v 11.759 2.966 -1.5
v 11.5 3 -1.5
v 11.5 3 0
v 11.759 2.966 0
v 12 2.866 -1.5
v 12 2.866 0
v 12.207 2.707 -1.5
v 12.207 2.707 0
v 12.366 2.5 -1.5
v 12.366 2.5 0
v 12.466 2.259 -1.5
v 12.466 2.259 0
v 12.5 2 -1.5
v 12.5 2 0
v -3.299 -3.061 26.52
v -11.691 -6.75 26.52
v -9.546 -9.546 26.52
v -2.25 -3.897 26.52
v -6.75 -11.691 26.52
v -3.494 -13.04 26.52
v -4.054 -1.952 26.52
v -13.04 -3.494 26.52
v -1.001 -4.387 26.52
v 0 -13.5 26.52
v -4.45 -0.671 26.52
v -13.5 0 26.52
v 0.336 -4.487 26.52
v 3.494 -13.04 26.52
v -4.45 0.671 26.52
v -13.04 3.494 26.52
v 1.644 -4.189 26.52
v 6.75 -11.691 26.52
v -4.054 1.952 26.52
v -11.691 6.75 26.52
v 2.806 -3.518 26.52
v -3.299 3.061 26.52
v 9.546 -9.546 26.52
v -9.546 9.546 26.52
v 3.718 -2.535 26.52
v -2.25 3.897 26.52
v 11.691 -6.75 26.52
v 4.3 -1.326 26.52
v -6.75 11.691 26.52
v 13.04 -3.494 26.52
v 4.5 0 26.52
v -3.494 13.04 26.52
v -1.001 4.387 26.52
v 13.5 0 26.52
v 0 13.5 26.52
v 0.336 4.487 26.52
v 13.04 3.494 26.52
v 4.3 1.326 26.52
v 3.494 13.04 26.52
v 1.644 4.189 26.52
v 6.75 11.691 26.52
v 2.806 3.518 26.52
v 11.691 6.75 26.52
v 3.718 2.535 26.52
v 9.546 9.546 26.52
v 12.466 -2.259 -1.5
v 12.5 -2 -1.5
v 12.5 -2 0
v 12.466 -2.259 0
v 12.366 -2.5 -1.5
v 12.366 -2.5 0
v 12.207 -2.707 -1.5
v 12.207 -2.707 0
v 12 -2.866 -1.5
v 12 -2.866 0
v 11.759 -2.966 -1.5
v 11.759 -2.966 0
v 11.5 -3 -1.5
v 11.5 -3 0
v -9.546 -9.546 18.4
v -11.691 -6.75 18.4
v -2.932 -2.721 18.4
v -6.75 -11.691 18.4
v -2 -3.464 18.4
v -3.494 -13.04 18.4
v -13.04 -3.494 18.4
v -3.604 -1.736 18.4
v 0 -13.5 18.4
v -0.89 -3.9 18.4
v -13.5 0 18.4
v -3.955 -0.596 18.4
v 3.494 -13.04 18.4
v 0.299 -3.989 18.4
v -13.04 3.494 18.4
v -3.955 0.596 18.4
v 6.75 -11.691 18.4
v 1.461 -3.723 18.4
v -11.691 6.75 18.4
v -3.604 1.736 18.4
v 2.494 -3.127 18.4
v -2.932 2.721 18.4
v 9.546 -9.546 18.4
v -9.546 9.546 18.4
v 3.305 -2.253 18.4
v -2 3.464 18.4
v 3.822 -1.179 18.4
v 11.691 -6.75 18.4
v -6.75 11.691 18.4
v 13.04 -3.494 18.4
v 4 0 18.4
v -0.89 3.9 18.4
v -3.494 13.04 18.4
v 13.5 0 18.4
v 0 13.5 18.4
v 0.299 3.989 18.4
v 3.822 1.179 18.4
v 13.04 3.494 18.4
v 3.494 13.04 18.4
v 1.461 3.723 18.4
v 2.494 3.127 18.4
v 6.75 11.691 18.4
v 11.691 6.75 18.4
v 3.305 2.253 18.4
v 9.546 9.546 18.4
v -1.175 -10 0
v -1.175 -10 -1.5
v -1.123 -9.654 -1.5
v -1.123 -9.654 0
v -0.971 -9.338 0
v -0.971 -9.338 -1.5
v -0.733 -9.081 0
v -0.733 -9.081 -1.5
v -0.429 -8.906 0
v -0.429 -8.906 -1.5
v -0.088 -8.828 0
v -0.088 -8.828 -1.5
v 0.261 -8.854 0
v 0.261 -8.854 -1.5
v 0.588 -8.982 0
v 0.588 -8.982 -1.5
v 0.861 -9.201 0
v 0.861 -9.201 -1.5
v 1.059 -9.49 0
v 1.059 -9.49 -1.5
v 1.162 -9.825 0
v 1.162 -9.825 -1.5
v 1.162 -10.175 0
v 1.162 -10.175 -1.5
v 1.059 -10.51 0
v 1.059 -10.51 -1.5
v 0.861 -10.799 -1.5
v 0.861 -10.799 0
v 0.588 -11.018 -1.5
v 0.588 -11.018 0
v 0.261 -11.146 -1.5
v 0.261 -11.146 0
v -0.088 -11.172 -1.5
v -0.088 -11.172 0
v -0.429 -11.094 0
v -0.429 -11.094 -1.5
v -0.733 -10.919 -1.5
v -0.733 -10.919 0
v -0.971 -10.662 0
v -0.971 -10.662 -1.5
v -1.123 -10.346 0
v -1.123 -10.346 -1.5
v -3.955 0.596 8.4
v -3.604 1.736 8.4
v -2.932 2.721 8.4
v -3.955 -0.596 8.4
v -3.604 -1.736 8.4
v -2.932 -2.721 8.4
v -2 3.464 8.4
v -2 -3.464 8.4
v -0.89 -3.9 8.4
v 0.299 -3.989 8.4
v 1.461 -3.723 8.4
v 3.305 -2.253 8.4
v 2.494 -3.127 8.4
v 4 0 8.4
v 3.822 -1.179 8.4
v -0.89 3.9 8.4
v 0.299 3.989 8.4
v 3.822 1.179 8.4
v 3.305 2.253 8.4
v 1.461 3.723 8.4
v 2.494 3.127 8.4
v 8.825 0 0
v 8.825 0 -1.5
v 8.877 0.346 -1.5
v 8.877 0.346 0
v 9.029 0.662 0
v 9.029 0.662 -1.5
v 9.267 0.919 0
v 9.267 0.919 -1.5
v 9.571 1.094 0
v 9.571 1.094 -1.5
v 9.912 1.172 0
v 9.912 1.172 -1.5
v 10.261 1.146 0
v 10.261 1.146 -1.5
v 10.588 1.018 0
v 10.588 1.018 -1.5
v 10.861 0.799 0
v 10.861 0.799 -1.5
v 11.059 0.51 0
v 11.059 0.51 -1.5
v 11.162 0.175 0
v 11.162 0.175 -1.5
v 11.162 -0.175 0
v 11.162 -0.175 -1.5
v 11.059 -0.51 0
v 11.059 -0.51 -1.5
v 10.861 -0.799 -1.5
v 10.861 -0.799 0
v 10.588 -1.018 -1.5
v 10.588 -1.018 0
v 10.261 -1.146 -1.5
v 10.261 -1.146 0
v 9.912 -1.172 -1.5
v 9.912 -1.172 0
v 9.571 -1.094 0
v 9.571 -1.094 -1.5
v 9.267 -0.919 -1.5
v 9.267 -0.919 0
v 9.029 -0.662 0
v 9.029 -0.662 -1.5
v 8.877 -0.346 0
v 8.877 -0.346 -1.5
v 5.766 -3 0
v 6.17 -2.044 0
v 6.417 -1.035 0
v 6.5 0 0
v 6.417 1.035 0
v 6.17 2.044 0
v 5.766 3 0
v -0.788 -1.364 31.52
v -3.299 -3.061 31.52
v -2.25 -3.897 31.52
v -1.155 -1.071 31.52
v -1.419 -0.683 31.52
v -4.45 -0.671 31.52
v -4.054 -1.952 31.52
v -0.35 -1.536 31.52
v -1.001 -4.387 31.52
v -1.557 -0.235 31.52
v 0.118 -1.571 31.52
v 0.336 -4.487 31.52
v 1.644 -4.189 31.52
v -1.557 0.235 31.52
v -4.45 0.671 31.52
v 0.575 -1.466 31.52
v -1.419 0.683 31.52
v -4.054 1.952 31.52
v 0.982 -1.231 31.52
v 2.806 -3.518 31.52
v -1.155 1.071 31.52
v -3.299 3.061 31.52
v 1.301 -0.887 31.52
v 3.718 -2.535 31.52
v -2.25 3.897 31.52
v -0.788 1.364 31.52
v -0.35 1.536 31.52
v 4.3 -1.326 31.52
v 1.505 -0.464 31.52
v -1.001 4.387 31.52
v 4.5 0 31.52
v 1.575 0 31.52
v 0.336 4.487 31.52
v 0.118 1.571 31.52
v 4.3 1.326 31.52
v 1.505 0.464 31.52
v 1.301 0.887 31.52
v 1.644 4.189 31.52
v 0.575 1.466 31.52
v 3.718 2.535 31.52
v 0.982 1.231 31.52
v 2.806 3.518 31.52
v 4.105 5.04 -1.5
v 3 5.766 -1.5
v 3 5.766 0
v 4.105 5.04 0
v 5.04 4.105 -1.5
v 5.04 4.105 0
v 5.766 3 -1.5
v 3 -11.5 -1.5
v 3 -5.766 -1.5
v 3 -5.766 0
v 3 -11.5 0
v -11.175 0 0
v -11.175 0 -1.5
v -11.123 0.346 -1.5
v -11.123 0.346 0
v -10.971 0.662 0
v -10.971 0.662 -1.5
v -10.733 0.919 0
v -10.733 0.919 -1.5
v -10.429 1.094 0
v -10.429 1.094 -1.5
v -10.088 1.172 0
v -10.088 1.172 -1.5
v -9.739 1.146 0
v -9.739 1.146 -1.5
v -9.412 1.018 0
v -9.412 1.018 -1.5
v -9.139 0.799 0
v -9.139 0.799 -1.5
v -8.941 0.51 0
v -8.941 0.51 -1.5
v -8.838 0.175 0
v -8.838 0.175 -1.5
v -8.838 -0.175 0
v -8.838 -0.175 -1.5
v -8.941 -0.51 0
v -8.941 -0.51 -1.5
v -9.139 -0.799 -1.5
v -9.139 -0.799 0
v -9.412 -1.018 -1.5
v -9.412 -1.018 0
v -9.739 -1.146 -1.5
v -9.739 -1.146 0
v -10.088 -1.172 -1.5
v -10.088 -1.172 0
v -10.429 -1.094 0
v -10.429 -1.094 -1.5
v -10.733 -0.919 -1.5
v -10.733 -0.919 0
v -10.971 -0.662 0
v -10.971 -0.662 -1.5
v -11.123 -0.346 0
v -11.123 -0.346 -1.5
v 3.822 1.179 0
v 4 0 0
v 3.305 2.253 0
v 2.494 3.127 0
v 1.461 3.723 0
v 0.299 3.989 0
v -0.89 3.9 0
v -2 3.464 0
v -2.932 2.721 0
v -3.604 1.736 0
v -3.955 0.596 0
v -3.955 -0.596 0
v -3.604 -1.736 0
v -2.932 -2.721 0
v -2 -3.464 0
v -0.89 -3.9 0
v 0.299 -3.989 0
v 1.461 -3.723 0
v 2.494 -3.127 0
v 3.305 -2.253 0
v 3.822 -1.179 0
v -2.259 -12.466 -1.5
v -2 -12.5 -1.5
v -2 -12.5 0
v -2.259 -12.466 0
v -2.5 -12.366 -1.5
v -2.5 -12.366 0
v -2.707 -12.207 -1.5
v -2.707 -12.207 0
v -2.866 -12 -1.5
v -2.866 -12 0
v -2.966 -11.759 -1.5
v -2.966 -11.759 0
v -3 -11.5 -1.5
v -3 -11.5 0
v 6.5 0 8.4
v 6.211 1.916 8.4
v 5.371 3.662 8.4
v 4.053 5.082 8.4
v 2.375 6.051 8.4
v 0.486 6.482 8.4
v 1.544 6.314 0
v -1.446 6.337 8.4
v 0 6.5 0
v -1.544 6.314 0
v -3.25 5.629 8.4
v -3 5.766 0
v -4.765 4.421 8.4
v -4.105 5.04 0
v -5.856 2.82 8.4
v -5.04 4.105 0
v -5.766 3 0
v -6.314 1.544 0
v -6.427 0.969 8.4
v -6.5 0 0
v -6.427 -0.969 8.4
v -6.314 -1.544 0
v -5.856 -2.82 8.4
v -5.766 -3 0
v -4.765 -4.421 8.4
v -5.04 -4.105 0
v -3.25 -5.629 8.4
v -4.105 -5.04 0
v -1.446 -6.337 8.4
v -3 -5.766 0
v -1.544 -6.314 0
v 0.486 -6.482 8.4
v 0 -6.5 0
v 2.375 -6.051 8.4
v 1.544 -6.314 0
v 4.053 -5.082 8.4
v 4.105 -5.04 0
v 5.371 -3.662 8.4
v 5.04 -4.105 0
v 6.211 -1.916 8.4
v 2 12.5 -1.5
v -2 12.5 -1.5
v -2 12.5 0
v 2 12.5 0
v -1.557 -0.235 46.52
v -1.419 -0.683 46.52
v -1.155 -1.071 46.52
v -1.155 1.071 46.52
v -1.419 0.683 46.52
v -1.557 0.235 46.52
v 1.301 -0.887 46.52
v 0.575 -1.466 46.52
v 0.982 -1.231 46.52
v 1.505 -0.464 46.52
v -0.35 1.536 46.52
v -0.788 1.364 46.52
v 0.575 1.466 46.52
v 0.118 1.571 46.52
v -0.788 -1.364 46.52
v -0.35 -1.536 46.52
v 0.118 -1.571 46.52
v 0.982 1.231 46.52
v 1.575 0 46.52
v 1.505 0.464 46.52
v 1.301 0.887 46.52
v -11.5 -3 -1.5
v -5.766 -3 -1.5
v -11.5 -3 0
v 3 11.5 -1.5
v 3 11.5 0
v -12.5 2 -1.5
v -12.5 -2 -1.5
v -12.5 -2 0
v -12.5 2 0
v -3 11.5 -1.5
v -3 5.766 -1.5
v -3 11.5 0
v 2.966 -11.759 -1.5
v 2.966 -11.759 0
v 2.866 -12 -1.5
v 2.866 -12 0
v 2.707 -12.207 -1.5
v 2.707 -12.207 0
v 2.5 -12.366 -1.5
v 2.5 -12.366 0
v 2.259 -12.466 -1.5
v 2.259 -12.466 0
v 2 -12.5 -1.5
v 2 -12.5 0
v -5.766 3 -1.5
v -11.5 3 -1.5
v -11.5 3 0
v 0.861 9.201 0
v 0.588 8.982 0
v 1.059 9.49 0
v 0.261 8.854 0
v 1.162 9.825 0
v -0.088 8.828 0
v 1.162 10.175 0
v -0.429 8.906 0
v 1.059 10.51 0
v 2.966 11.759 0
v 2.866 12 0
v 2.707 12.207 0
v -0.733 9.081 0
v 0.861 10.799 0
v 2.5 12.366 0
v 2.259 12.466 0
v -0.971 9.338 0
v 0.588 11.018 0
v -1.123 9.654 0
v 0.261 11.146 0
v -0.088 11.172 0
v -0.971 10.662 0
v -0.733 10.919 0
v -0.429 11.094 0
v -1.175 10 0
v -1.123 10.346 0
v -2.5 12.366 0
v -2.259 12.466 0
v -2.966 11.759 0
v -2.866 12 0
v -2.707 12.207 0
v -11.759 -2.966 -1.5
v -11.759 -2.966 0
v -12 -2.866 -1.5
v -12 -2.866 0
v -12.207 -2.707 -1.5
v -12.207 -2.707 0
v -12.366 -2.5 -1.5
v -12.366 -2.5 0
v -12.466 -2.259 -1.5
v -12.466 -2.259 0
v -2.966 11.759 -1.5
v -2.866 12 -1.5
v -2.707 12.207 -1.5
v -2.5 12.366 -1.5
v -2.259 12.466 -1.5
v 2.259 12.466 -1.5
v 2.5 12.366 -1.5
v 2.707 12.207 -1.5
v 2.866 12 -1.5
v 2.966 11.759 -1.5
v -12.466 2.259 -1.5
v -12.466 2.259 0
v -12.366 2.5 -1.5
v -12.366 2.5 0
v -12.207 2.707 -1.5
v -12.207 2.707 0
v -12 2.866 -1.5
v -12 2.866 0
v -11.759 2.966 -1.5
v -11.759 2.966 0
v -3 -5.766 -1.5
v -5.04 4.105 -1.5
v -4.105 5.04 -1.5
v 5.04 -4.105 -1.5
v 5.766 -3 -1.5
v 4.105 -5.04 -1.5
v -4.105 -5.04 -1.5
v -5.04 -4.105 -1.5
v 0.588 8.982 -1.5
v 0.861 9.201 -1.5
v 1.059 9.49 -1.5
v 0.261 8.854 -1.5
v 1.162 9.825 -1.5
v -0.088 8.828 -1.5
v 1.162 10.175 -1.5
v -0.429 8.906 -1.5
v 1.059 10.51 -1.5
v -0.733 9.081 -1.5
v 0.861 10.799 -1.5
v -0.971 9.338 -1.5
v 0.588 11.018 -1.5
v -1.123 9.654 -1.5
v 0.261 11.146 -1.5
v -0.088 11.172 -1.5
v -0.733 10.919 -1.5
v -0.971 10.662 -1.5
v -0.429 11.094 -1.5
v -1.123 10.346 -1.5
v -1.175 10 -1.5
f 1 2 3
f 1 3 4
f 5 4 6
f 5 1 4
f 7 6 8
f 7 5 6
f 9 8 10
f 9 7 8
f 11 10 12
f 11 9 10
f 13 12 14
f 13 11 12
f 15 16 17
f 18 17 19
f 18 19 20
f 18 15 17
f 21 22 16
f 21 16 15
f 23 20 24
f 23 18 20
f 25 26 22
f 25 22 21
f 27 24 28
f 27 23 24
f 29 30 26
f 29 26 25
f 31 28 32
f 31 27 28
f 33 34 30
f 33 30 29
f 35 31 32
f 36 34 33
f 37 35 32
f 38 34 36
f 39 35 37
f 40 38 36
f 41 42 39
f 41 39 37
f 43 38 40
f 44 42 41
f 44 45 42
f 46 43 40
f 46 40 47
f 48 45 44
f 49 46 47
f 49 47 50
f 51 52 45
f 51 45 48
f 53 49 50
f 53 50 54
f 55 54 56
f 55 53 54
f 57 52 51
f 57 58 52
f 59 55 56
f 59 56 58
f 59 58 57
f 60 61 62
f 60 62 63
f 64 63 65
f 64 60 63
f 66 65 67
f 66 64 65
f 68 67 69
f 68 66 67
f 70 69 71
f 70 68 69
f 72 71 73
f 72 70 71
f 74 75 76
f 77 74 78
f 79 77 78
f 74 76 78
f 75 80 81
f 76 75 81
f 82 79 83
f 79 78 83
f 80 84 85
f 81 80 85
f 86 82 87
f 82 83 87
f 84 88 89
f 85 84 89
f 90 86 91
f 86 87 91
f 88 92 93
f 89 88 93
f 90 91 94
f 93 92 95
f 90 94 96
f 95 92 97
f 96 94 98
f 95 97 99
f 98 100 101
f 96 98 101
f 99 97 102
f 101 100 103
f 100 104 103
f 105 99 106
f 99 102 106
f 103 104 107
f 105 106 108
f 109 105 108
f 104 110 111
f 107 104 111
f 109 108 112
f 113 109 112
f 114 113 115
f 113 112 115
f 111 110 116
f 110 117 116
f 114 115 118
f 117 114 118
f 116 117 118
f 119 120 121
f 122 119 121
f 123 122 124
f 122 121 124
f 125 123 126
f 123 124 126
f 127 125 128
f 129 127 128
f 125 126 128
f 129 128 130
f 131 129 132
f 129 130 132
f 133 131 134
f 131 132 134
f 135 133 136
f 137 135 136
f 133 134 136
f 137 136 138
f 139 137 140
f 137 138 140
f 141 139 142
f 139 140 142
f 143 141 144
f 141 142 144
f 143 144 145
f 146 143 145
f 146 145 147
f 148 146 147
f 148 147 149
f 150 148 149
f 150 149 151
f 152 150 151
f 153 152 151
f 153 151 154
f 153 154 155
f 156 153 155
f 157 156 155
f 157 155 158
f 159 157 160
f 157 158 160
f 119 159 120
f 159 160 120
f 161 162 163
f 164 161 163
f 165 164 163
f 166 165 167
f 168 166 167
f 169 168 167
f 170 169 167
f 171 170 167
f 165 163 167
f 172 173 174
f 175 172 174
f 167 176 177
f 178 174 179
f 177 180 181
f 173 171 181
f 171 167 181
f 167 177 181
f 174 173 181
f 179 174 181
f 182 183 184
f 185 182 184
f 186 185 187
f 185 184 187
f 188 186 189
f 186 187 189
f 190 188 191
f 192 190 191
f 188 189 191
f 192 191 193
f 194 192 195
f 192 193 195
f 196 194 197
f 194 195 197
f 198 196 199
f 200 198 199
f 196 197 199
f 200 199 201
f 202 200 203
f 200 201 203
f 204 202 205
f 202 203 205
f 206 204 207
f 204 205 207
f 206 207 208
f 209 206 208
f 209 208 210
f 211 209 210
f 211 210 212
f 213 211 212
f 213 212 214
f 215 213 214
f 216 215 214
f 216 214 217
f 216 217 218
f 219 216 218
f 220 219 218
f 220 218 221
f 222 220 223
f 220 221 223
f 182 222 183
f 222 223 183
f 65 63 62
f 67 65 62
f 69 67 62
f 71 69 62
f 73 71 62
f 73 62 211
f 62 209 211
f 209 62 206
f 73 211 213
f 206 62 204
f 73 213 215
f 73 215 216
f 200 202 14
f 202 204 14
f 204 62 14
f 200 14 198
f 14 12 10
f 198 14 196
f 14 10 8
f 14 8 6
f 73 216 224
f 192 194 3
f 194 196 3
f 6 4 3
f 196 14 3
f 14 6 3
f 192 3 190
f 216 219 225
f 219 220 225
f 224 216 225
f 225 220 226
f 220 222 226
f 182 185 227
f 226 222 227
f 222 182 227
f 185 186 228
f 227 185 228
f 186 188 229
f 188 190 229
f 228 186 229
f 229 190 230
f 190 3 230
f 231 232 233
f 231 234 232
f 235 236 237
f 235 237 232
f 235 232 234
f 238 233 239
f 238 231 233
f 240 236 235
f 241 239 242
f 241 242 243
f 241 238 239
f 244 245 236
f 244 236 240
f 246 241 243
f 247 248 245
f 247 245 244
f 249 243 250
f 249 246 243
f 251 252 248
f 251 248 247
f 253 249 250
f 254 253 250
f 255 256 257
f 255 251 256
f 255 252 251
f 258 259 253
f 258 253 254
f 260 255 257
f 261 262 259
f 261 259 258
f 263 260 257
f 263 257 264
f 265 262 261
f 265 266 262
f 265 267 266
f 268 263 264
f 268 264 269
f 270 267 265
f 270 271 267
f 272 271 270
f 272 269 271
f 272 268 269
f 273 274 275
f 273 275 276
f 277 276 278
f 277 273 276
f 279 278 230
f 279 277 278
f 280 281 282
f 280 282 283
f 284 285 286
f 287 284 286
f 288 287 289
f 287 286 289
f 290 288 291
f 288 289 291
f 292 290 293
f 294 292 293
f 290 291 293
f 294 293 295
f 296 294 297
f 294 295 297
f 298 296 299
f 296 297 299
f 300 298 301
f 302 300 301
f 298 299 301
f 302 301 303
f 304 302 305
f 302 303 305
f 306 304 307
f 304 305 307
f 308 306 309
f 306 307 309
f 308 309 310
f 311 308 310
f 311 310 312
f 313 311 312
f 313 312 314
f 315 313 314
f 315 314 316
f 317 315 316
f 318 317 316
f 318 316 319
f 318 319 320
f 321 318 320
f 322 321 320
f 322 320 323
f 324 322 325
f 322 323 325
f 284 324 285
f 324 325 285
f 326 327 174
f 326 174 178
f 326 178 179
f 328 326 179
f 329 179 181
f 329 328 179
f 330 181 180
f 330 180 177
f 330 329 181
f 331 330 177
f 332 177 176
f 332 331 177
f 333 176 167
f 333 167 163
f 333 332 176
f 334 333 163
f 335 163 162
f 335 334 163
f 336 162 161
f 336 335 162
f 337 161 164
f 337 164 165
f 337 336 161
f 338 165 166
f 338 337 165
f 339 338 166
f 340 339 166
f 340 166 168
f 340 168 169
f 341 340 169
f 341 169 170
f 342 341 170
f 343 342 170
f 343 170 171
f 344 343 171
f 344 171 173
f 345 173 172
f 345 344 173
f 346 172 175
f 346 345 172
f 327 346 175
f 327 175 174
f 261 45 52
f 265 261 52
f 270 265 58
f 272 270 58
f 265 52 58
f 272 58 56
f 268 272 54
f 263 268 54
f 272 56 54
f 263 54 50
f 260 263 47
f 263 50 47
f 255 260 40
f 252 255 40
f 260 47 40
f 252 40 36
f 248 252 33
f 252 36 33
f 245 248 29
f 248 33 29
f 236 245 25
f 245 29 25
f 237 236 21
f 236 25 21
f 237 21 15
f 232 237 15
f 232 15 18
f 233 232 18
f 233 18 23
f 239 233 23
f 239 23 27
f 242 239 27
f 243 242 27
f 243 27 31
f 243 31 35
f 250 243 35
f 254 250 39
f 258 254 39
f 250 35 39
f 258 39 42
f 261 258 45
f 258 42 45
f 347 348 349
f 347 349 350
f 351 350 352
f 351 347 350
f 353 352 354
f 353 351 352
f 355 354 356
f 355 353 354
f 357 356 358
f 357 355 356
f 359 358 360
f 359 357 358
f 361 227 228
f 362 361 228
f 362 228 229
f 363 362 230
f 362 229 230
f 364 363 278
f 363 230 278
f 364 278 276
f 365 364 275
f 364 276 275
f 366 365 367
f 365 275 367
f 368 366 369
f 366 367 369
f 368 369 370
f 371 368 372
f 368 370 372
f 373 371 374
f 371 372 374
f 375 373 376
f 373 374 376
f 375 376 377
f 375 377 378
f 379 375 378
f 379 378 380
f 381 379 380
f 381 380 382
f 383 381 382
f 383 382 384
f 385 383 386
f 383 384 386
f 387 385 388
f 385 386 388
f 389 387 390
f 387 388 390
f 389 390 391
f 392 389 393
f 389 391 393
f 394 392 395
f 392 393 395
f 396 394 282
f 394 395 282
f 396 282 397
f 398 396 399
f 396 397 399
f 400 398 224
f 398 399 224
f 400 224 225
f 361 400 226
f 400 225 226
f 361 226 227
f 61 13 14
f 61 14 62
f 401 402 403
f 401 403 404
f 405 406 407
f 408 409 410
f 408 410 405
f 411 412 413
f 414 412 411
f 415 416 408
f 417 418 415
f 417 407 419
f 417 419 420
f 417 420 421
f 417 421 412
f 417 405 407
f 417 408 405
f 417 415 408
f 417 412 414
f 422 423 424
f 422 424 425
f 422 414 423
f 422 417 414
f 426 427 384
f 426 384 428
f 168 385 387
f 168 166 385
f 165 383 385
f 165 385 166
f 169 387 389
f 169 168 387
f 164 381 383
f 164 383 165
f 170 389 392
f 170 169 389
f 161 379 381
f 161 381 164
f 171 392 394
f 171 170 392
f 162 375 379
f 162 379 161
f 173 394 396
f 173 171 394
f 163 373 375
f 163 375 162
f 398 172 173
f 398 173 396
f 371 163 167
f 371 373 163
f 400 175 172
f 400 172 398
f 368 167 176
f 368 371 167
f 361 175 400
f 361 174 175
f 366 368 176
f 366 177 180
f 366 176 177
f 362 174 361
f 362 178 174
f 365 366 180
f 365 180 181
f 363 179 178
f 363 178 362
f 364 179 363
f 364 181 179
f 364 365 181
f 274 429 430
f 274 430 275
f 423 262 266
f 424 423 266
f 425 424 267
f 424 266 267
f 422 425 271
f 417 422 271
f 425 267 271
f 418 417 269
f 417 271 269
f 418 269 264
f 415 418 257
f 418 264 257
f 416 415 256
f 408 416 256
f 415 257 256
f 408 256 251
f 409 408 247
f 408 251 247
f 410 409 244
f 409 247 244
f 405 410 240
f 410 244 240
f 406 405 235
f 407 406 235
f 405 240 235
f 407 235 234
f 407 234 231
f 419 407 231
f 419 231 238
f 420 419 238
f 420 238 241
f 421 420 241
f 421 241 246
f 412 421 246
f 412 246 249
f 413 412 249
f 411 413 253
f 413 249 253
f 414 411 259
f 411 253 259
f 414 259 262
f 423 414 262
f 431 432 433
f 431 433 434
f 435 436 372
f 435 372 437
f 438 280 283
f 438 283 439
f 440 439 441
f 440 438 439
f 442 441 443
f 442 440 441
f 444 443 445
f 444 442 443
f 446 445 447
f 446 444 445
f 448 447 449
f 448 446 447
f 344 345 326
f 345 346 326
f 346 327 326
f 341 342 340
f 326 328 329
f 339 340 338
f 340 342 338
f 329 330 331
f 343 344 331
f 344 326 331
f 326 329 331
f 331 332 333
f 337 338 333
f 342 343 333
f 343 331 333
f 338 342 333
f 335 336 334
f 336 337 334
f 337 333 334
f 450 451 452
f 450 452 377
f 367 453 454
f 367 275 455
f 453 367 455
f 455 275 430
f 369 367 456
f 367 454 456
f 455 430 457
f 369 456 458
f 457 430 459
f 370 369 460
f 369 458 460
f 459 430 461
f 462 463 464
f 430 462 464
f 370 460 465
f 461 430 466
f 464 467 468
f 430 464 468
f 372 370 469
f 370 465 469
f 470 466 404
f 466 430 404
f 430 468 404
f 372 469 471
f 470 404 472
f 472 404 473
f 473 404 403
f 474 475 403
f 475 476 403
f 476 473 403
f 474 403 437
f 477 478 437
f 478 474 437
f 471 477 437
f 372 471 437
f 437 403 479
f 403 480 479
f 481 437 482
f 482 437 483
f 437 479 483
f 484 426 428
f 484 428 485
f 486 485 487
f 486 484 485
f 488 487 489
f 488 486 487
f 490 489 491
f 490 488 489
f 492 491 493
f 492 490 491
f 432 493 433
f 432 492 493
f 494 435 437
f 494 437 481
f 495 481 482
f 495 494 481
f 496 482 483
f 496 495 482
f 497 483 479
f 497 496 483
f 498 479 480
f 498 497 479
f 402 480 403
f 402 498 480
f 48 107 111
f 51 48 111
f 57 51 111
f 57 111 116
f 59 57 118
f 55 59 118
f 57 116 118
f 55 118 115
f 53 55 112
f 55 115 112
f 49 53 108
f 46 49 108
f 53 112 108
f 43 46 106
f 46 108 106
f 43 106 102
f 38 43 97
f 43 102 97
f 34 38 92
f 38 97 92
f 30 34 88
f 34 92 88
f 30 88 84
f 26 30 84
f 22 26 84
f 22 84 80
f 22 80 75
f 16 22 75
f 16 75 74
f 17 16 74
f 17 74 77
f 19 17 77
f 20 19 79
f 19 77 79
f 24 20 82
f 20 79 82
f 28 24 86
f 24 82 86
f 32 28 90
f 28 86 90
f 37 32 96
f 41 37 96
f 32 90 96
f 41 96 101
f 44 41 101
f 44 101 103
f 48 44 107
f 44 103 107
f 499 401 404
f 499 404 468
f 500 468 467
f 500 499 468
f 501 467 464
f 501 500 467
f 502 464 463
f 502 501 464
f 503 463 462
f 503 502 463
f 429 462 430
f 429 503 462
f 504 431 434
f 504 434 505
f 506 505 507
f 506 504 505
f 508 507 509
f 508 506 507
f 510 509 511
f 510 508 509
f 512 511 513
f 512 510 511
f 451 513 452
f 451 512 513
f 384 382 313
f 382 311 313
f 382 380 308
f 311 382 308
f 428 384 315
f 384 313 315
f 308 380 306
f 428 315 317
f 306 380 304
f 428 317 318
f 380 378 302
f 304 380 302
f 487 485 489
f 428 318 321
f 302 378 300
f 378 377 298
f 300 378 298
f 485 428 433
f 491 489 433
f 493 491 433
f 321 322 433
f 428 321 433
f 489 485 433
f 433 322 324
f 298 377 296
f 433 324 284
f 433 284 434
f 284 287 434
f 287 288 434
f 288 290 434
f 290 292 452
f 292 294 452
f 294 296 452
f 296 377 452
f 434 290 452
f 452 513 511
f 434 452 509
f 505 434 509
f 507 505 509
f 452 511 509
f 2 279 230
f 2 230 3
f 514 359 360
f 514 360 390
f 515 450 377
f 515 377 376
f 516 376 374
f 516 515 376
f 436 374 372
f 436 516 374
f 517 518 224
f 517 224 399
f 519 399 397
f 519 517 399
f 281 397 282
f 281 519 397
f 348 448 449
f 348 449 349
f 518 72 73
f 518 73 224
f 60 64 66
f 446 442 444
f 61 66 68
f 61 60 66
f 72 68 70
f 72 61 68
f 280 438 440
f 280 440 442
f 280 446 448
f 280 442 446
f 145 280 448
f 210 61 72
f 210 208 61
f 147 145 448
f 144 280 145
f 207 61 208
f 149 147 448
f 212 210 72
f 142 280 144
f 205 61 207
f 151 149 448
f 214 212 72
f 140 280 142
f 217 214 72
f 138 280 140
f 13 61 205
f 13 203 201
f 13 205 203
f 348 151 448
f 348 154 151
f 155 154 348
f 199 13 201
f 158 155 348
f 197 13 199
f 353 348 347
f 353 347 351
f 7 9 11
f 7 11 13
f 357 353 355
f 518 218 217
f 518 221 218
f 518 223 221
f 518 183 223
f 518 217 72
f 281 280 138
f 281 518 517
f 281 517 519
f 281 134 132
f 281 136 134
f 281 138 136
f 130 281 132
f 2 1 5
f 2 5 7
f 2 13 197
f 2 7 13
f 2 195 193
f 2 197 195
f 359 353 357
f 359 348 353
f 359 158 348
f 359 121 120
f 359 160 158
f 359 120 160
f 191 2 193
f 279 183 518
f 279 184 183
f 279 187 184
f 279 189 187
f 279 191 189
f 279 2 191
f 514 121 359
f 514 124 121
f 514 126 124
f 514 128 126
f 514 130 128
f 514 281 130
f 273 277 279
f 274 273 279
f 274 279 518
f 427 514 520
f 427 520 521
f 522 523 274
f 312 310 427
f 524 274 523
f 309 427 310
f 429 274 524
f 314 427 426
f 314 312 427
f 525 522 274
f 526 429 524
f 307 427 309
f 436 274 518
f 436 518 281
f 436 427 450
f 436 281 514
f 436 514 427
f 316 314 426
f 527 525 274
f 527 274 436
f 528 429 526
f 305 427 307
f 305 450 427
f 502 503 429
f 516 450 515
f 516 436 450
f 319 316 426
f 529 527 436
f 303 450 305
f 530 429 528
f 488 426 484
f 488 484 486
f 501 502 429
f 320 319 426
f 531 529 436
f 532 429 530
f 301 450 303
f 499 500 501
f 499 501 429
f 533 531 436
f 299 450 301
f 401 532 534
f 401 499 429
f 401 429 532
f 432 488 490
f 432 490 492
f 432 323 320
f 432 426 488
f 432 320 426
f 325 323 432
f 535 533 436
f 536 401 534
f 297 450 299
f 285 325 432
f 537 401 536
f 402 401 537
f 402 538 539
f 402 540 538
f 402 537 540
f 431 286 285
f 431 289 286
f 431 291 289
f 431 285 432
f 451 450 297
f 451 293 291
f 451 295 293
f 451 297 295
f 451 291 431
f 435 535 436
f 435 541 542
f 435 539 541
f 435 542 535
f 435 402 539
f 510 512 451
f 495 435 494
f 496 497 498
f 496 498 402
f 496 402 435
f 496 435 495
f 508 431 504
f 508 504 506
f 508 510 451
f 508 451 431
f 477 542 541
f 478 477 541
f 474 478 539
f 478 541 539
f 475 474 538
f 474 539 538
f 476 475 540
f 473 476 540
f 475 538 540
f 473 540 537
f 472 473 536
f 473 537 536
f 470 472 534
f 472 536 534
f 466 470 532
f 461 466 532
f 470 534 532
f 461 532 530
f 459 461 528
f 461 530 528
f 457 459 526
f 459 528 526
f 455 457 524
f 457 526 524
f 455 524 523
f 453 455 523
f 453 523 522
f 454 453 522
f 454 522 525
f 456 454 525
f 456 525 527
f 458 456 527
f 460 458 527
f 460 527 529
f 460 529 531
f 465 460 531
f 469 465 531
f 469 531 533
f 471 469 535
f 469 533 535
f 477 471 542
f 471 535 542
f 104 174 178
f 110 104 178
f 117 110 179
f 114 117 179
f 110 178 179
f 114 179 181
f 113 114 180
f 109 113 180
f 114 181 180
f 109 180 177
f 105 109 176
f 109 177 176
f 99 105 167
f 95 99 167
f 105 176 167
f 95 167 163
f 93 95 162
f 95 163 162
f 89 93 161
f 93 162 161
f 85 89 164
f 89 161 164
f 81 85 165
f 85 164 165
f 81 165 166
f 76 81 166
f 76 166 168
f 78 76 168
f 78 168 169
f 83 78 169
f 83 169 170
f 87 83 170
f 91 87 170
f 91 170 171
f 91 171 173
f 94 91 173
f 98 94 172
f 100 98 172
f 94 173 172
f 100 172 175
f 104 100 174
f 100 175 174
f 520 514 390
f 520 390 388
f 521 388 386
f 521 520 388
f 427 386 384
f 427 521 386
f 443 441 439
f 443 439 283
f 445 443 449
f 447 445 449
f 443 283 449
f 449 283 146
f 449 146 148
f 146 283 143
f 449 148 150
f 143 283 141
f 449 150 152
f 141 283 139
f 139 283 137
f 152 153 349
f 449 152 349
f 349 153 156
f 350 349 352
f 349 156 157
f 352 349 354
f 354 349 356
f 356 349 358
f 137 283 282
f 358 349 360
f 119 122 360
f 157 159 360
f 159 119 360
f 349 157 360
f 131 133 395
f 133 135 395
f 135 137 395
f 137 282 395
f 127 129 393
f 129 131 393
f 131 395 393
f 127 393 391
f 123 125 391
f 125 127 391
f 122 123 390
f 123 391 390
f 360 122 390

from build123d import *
from build123d.topology import SkipClean

# Parameters (mm, degrees)
CROQUIS1_R              = 6.5
CROQUIS1_R_2            = 4
SALIENTE_EXTRUIR1_DEPTH = 8.4
CROQUIS2_R              = 4
SALIENTE_EXTRUIR2_DEPTH = 10
CROQUIS3_R              = 13.5
SALIENTE_EXTRUIR3_DEPTH = 8.12
CROQUIS4_R              = 4.5
SALIENTE_EXTRUIR4_DEPTH = 5
CROQUIS5_R              = 1.575
SALIENTE_EXTRUIR5_DEPTH = 15
SALIENTE_EXTRUIR6_START = 1.5
CROQUIS6_R              = 1.175
SALIENTE_EXTRUIR6_DEPTH = 1.5


with BuildPart() as part:
    # Croquis1 → Saliente-Extruir1 (new body)
    with BuildSketch(Plane.XY):
        Circle(CROQUIS1_R)
        Circle(CROQUIS1_R_2, mode=Mode.SUBTRACT)
    extrude(amount=SALIENTE_EXTRUIR1_DEPTH)

    # Croquis6 → Saliente-Extruir6 (add)
    with SkipClean():  # the faces are left unmerged after this step: merging them gives an invalid solid
        with BuildSketch(Plane(origin=(0, 0, 0), x_dir=(-1, 0, 0), z_dir=(0, 0, -1)).offset(SALIENTE_EXTRUIR6_START)):
            with BuildLine():
                Line((-2, -12.5), (2, -12.5))
                ThreePointArc((2, -12.5), (2.707106781, -12.207106781), (3, -11.5))
                Line((3, -11.5), (3, -5.766281297))
                ThreePointArc((3, -5.766281297), (4.596194078, -4.596194078), (5.766281297, -3))
                Line((5.766281297, -3), (11.5, -3))
                ThreePointArc((11.5, -3), (12.207106781, -2.707106781), (12.5, -2))
                Line((12.5, -2), (12.5, 2))
                ThreePointArc((12.5, 2), (12.207106781, 2.707106781), (11.5, 3))
                Line((11.5, 3), (5.766281297, 3))
                ThreePointArc((5.766281297, 3), (4.596194078, 4.596194078), (3, 5.766281297))
                Line((3, 5.766281297), (3, 11.5))
                ThreePointArc((3, 11.5), (2.707106781, 12.207106781), (2, 12.5))
                Line((2, 12.5), (-2, 12.5))
                ThreePointArc((-2, 12.5), (-2.707106781, 12.207106781), (-3, 11.5))
                Line((-3, 11.5), (-3, 5.766281297))
                ThreePointArc((-3, 5.766281297), (-4.596194078, 4.596194078), (-5.766281297, 3))
                Line((-5.766281297, 3), (-11.5, 3))
                ThreePointArc((-11.5, 3), (-12.207106781, 2.707106781), (-12.5, 2))
                Line((-12.5, 2), (-12.5, -2))
                ThreePointArc((-12.5, -2), (-12.207106781, -2.707106781), (-11.5, -3))
                Line((-11.5, -3), (-5.766281297, -3))
                ThreePointArc((-5.766281297, -3), (-4.596194078, -4.596194078), (-3, -5.766281297))
                Line((-3, -5.766281297), (-3, -11.5))
                ThreePointArc((-3, -11.5), (-2.707106781, -12.207106781), (-2, -12.5))
            make_face()
            with Locations((0, -10)):
                Circle(CROQUIS6_R, mode=Mode.SUBTRACT)
            with Locations((-10, 0)):
                Circle(CROQUIS6_R, mode=Mode.SUBTRACT)
            with Locations((0, 10)):
                Circle(CROQUIS6_R, mode=Mode.SUBTRACT)
            with Locations((10, 0)):
                Circle(CROQUIS6_R, mode=Mode.SUBTRACT)
        extrude(amount=-SALIENTE_EXTRUIR6_DEPTH)


with BuildPart() as body_2:
    # Croquis2 → Saliente-Extruir2 (new body)
    with BuildSketch(Plane.XY.offset(8.4)):
        Circle(CROQUIS2_R)
    extrude(amount=SALIENTE_EXTRUIR2_DEPTH)

    # Croquis3 → Saliente-Extruir3 (add)
    with BuildSketch(Plane.XY.offset(18.4)):
        Circle(CROQUIS3_R)
    extrude(amount=SALIENTE_EXTRUIR3_DEPTH)

    # Croquis4 → Saliente-Extruir4 (add)
    with BuildSketch(Plane.XY.offset(26.52)):
        Circle(CROQUIS4_R)
    extrude(amount=SALIENTE_EXTRUIR4_DEPTH)

    # Croquis5 → Saliente-Extruir5 (add)
    with BuildSketch(Plane.XY.offset(31.52)):
        Circle(CROQUIS5_R)
    extrude(amount=SALIENTE_EXTRUIR5_DEPTH)


solid = Compound([part.part, body_2.part])
